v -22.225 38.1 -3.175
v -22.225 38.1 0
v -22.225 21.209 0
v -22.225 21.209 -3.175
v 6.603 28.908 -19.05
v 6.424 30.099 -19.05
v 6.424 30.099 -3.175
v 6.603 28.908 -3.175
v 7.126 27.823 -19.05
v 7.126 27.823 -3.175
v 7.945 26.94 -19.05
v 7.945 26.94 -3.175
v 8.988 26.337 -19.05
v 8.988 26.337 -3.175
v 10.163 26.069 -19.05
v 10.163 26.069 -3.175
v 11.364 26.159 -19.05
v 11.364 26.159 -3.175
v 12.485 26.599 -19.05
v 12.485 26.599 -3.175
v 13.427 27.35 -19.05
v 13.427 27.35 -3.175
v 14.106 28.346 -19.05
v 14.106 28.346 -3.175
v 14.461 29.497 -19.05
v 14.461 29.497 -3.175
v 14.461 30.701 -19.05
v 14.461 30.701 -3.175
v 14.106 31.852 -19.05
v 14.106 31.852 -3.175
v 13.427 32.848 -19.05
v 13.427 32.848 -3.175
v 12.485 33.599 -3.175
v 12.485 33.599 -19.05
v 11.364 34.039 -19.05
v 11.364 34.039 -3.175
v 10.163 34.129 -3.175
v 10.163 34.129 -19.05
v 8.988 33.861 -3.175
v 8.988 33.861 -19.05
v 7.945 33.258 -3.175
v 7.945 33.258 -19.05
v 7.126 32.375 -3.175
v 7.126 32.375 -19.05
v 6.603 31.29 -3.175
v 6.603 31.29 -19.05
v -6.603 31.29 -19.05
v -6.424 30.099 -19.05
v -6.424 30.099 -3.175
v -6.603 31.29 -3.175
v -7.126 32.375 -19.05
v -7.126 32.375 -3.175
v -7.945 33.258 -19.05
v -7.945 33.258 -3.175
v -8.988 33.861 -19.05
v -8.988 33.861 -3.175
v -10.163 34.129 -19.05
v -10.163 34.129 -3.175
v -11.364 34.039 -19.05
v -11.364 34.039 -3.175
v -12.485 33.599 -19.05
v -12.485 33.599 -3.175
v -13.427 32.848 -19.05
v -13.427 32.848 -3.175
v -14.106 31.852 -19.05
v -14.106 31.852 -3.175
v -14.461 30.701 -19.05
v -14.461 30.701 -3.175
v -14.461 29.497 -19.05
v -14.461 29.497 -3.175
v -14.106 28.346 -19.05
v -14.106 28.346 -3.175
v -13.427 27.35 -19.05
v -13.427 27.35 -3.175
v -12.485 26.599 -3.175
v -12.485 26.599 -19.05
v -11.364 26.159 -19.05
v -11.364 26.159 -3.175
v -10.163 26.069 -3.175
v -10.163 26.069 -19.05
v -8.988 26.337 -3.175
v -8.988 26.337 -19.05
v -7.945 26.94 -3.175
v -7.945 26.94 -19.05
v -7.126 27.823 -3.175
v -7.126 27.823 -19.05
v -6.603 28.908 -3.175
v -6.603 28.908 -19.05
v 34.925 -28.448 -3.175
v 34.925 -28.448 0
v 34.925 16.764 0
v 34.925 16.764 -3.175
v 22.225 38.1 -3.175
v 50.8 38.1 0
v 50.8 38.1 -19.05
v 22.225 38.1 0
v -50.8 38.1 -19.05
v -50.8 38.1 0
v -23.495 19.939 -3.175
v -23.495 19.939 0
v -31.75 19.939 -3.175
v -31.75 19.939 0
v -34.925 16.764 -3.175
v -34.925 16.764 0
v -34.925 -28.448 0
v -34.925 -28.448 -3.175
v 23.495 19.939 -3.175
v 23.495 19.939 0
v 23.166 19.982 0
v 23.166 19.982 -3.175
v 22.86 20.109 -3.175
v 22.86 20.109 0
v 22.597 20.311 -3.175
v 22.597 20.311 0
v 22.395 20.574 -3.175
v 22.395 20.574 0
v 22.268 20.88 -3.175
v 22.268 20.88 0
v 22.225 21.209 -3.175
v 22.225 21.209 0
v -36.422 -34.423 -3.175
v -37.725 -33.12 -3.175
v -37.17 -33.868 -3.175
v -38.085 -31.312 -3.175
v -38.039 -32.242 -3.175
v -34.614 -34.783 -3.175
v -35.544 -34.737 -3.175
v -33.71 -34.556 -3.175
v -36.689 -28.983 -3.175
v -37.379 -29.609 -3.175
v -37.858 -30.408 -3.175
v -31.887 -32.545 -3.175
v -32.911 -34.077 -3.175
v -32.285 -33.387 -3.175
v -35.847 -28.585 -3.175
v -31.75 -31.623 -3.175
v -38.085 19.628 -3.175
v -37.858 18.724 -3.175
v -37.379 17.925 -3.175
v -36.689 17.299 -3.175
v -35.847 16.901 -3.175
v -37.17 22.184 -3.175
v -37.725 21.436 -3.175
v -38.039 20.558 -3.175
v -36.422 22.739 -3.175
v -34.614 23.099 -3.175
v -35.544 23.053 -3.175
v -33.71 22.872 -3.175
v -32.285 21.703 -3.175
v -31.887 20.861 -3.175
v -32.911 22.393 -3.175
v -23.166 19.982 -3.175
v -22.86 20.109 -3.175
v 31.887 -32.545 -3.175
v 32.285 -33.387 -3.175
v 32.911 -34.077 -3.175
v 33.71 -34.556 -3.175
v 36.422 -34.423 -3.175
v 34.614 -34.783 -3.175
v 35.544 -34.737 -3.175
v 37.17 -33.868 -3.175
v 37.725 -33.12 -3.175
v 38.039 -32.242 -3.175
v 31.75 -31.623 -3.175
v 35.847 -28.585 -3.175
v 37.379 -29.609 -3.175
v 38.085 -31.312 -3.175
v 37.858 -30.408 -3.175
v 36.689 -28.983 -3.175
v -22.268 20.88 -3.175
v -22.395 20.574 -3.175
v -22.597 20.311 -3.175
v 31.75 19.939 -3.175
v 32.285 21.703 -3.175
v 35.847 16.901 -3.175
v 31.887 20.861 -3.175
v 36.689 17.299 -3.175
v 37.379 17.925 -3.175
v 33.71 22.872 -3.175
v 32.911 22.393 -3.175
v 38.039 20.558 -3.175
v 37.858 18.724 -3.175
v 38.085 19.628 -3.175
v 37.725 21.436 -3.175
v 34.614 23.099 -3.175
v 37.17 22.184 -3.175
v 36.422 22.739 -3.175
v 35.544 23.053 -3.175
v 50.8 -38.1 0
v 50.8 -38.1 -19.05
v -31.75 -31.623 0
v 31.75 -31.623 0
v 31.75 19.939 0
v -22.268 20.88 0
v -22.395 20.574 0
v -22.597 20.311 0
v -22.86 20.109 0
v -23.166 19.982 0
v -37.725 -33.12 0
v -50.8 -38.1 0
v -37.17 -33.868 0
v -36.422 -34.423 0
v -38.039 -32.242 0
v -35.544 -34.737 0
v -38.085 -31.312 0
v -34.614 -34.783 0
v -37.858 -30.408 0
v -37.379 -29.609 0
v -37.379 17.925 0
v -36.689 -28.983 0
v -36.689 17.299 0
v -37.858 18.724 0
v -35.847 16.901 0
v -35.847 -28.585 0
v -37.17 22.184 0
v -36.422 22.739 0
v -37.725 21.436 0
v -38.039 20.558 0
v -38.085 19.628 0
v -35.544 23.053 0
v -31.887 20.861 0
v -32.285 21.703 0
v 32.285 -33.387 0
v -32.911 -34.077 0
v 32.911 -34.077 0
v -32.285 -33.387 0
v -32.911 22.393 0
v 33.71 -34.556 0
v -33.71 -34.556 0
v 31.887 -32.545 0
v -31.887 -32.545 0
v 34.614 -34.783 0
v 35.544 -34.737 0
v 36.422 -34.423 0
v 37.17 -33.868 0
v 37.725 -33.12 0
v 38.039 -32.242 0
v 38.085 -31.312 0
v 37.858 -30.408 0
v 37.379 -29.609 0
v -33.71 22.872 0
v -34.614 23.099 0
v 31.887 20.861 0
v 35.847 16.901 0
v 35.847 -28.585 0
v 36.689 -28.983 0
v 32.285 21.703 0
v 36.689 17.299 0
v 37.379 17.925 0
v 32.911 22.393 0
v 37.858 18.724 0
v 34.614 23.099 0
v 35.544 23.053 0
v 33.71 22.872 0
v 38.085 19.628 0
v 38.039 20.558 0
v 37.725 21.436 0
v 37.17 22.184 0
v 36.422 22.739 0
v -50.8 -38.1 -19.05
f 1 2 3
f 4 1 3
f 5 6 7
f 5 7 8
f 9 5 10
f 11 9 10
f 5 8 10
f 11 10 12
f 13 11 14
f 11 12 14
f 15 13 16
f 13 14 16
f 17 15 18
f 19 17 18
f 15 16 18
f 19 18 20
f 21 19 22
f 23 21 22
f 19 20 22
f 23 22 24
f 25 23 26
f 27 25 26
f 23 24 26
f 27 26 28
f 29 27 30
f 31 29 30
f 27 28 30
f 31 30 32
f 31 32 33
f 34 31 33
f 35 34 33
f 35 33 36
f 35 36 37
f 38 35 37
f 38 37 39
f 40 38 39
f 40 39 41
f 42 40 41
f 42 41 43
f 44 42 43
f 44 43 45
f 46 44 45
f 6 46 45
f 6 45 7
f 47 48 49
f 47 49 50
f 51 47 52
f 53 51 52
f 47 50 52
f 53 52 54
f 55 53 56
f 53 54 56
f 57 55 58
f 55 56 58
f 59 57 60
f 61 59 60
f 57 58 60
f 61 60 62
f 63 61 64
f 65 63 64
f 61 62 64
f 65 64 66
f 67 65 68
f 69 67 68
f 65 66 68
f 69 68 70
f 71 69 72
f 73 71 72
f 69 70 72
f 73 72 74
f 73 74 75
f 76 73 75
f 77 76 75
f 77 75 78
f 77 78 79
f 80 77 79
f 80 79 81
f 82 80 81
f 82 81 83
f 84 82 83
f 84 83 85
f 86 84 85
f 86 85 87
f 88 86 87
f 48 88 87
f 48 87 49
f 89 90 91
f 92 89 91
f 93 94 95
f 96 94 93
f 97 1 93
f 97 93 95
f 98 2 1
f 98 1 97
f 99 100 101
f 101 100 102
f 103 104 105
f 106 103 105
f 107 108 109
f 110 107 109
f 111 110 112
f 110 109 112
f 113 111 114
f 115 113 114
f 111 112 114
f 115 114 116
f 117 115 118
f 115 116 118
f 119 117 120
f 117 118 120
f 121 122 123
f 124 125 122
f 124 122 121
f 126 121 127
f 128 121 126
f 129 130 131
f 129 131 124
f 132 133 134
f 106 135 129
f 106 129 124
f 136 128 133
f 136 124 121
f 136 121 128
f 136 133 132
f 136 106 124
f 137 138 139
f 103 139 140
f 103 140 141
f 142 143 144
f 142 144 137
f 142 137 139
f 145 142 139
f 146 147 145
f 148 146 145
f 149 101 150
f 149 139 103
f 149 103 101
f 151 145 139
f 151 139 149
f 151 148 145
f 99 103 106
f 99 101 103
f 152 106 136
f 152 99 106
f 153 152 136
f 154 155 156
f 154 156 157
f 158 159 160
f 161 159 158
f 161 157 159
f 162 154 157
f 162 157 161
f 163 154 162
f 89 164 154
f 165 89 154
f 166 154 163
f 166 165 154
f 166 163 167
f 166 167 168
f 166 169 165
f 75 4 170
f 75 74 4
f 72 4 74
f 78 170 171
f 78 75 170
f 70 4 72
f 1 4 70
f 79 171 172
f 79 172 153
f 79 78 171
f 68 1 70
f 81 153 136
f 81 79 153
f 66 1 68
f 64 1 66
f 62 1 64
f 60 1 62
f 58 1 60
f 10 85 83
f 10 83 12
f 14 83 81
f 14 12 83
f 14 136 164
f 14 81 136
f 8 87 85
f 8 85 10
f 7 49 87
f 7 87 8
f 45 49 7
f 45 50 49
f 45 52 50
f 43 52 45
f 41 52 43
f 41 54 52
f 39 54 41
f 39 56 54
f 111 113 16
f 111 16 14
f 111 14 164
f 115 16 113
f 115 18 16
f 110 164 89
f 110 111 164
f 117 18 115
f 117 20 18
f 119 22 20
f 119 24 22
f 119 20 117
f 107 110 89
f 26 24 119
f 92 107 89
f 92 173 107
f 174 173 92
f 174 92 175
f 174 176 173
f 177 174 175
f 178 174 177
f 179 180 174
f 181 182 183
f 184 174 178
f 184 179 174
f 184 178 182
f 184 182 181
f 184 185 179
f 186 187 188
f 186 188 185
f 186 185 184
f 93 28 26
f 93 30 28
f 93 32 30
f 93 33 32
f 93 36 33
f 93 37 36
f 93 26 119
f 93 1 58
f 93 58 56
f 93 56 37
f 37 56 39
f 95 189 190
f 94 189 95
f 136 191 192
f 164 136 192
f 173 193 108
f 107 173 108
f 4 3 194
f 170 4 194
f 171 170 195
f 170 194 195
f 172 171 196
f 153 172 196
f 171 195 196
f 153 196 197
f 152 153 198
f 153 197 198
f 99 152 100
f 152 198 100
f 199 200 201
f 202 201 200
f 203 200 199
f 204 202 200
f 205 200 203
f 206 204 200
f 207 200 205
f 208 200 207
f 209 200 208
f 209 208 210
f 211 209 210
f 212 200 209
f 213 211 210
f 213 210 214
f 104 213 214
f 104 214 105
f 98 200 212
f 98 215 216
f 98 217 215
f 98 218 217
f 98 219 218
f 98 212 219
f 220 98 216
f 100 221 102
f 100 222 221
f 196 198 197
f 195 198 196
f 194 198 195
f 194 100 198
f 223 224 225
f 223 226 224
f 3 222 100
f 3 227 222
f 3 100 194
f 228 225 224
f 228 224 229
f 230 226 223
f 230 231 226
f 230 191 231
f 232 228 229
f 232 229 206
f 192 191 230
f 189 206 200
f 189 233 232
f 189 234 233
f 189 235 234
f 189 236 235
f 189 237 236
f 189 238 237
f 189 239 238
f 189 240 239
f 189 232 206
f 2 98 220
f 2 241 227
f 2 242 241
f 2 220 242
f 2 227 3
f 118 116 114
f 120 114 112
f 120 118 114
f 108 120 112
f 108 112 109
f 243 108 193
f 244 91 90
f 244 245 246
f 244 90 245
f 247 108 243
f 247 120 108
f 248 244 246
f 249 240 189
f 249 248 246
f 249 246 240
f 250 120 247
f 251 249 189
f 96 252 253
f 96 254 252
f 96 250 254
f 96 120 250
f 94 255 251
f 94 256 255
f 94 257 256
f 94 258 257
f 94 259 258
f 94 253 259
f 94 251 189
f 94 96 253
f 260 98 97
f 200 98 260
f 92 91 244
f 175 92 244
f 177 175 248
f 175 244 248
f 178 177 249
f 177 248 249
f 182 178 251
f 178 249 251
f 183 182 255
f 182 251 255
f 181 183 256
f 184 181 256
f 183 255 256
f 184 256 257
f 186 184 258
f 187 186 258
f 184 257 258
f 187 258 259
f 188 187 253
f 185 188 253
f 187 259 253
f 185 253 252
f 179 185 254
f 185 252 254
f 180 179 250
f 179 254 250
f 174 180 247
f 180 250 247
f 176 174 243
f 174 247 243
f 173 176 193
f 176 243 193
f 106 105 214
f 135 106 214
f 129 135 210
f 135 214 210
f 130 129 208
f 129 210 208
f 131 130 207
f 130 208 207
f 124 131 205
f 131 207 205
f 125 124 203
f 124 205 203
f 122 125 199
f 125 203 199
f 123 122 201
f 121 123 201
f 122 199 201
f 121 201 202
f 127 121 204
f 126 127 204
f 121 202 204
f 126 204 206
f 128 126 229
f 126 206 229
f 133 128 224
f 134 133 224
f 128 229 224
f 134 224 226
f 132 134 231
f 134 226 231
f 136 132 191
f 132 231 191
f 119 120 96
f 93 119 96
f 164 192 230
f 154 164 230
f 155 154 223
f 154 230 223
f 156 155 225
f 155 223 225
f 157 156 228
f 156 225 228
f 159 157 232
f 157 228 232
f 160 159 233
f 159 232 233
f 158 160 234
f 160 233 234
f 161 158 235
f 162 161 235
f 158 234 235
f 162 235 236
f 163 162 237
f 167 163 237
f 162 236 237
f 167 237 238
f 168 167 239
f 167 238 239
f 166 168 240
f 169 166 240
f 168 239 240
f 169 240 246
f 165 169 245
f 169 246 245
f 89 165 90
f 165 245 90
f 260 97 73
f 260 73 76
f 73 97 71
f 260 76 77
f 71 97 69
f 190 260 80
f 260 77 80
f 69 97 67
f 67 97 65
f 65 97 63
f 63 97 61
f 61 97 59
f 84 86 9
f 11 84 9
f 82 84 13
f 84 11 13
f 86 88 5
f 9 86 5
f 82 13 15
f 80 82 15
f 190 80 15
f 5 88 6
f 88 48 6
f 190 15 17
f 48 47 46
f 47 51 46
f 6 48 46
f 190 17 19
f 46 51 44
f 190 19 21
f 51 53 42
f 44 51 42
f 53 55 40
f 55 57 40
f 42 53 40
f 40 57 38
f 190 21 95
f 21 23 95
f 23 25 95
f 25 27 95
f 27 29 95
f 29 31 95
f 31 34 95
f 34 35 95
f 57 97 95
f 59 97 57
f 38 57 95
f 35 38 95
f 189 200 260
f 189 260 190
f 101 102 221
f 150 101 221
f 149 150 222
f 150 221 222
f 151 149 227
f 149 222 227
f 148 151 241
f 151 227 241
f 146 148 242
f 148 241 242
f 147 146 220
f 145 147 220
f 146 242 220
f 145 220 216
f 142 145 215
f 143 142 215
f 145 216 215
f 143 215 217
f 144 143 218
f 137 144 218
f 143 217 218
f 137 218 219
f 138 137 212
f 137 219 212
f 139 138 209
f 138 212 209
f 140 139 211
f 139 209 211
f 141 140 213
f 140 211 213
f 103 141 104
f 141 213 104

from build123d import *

# Parameters (mm, degrees)
F1_DEPTH = 19.05
F2_DEPTH = 3.175
F3_R     = 4.04114
F4_DEPTH = 25.4


with BuildPart() as f1:
    # F0 (on Top) → F1 (new body)
    with BuildSketch(Plane.XY):
        with BuildLine():
            Line((20.623783, -38.1), (50.8, -38.1))
            Line((50.8, -38.1), (50.8, 38.1))
            Line((50.8, 38.1), (22.225, 38.1))
            Line((22.225, 38.1), (22.225, 21.209))
            ThreePointArc((22.225, 21.209), (22.596974, 20.310974), (23.495, 19.939))
            Line((23.495, 19.939), (31.75, 19.939))
            ThreePointArc((31.75, 19.939), (37.170064, 22.184064), (34.925, 16.764))
            Line((34.925, 16.764), (34.925, -28.448))
            ThreePointArc((34.925, -28.448), (37.170064, -33.868064), (31.75, -31.623))
            Line((31.75, -31.623), (-31.75, -31.623))
            ThreePointArc((-31.75, -31.623), (-37.170064, -33.868064), (-34.925, -28.448))
            Line((-34.925, -28.448), (-34.925, 16.764))
            ThreePointArc((-34.925, 16.764), (-37.170064, 22.184064), (-31.75, 19.939))
            Line((-31.75, 19.939), (-23.495, 19.939))
            ThreePointArc((-23.495, 19.939), (-22.596974, 20.310974), (-22.225, 21.209))
            Line((-22.225, 21.209), (-22.225, 38.1))
            Line((-22.225, 38.1), (-50.8, 38.1))
            Line((-50.8, 38.1), (-50.8, -38.1))
            Line((-50.8, -38.1), (-20.623783, -38.1))
            Line((-20.623783, -38.1), (20.623783, -38.1))
        make_face()
        with BuildLine():
            Line((22.225, 21.209), (22.225, 38.1))
            Line((22.225, 38.1), (-22.225, 38.1))
            Line((-22.225, 38.1), (-22.225, 21.209))
            ThreePointArc((-22.225, 21.209), (-22.596974, 20.310974), (-23.495, 19.939))
            Line((-23.495, 19.939), (-31.75, 19.939))
            ThreePointArc((-31.75, 19.939), (-37.170064, 22.184064), (-34.925, 16.764))
            Line((-34.925, 16.764), (-34.925, -28.448))
            ThreePointArc((-34.925, -28.448), (-37.170064, -33.868064), (-31.75, -31.623))
            Line((-31.75, -31.623), (31.75, -31.623))
            ThreePointArc((31.75, -31.623), (37.170064, -33.868064), (34.925, -28.448))
            Line((34.925, -28.448), (34.925, 16.764))
            ThreePointArc((34.925, 16.764), (37.170064, 22.184064), (31.75, 19.939))
            Line((31.75, 19.939), (23.495, 19.939))
            ThreePointArc((23.495, 19.939), (22.596974, 20.310974), (22.225, 21.209))
        make_face()
    extrude(amount=-F1_DEPTH)

    # F0 (on Top) → F2 (cut)
    with BuildSketch(Plane.XY):
        with BuildLine():
            Line((22.225, 21.209), (22.225, 38.1))
            Line((22.225, 38.1), (-22.225, 38.1))
            Line((-22.225, 38.1), (-22.225, 21.209))
            ThreePointArc((-22.225, 21.209), (-22.596974, 20.310974), (-23.495, 19.939))
            Line((-23.495, 19.939), (-31.75, 19.939))
            ThreePointArc((-31.75, 19.939), (-37.170064, 22.184064), (-34.925, 16.764))
            Line((-34.925, 16.764), (-34.925, -28.448))
            ThreePointArc((-34.925, -28.448), (-37.170064, -33.868064), (-31.75, -31.623))
            Line((-31.75, -31.623), (31.75, -31.623))
            ThreePointArc((31.75, -31.623), (37.170064, -33.868064), (34.925, -28.448))
            Line((34.925, -28.448), (34.925, 16.764))
            ThreePointArc((34.925, 16.764), (37.170064, 22.184064), (31.75, 19.939))
            Line((31.75, 19.939), (23.495, 19.939))
            ThreePointArc((23.495, 19.939), (22.596974, 20.310974), (22.225, 21.209))
        make_face()
    extrude(amount=-F2_DEPTH, mode=Mode.SUBTRACT)

    # F3 (on face) → F4 (cut)
    with BuildSketch(Plane.XY.offset(-3.175)):
        with BuildLine():
            ThreePointArc((14.50594, 30.099), (10.4648, 34.14014), (6.42366, 30.099))
            ThreePointArc((6.42366, 30.099), (10.4648, 26.05786), (14.50594, 30.099))
        make_face()
        with Locations((-10.4648, 30.099)):
            Circle(F3_R)
    extrude(amount=-F4_DEPTH, mode=Mode.SUBTRACT)


solid = f1.part
